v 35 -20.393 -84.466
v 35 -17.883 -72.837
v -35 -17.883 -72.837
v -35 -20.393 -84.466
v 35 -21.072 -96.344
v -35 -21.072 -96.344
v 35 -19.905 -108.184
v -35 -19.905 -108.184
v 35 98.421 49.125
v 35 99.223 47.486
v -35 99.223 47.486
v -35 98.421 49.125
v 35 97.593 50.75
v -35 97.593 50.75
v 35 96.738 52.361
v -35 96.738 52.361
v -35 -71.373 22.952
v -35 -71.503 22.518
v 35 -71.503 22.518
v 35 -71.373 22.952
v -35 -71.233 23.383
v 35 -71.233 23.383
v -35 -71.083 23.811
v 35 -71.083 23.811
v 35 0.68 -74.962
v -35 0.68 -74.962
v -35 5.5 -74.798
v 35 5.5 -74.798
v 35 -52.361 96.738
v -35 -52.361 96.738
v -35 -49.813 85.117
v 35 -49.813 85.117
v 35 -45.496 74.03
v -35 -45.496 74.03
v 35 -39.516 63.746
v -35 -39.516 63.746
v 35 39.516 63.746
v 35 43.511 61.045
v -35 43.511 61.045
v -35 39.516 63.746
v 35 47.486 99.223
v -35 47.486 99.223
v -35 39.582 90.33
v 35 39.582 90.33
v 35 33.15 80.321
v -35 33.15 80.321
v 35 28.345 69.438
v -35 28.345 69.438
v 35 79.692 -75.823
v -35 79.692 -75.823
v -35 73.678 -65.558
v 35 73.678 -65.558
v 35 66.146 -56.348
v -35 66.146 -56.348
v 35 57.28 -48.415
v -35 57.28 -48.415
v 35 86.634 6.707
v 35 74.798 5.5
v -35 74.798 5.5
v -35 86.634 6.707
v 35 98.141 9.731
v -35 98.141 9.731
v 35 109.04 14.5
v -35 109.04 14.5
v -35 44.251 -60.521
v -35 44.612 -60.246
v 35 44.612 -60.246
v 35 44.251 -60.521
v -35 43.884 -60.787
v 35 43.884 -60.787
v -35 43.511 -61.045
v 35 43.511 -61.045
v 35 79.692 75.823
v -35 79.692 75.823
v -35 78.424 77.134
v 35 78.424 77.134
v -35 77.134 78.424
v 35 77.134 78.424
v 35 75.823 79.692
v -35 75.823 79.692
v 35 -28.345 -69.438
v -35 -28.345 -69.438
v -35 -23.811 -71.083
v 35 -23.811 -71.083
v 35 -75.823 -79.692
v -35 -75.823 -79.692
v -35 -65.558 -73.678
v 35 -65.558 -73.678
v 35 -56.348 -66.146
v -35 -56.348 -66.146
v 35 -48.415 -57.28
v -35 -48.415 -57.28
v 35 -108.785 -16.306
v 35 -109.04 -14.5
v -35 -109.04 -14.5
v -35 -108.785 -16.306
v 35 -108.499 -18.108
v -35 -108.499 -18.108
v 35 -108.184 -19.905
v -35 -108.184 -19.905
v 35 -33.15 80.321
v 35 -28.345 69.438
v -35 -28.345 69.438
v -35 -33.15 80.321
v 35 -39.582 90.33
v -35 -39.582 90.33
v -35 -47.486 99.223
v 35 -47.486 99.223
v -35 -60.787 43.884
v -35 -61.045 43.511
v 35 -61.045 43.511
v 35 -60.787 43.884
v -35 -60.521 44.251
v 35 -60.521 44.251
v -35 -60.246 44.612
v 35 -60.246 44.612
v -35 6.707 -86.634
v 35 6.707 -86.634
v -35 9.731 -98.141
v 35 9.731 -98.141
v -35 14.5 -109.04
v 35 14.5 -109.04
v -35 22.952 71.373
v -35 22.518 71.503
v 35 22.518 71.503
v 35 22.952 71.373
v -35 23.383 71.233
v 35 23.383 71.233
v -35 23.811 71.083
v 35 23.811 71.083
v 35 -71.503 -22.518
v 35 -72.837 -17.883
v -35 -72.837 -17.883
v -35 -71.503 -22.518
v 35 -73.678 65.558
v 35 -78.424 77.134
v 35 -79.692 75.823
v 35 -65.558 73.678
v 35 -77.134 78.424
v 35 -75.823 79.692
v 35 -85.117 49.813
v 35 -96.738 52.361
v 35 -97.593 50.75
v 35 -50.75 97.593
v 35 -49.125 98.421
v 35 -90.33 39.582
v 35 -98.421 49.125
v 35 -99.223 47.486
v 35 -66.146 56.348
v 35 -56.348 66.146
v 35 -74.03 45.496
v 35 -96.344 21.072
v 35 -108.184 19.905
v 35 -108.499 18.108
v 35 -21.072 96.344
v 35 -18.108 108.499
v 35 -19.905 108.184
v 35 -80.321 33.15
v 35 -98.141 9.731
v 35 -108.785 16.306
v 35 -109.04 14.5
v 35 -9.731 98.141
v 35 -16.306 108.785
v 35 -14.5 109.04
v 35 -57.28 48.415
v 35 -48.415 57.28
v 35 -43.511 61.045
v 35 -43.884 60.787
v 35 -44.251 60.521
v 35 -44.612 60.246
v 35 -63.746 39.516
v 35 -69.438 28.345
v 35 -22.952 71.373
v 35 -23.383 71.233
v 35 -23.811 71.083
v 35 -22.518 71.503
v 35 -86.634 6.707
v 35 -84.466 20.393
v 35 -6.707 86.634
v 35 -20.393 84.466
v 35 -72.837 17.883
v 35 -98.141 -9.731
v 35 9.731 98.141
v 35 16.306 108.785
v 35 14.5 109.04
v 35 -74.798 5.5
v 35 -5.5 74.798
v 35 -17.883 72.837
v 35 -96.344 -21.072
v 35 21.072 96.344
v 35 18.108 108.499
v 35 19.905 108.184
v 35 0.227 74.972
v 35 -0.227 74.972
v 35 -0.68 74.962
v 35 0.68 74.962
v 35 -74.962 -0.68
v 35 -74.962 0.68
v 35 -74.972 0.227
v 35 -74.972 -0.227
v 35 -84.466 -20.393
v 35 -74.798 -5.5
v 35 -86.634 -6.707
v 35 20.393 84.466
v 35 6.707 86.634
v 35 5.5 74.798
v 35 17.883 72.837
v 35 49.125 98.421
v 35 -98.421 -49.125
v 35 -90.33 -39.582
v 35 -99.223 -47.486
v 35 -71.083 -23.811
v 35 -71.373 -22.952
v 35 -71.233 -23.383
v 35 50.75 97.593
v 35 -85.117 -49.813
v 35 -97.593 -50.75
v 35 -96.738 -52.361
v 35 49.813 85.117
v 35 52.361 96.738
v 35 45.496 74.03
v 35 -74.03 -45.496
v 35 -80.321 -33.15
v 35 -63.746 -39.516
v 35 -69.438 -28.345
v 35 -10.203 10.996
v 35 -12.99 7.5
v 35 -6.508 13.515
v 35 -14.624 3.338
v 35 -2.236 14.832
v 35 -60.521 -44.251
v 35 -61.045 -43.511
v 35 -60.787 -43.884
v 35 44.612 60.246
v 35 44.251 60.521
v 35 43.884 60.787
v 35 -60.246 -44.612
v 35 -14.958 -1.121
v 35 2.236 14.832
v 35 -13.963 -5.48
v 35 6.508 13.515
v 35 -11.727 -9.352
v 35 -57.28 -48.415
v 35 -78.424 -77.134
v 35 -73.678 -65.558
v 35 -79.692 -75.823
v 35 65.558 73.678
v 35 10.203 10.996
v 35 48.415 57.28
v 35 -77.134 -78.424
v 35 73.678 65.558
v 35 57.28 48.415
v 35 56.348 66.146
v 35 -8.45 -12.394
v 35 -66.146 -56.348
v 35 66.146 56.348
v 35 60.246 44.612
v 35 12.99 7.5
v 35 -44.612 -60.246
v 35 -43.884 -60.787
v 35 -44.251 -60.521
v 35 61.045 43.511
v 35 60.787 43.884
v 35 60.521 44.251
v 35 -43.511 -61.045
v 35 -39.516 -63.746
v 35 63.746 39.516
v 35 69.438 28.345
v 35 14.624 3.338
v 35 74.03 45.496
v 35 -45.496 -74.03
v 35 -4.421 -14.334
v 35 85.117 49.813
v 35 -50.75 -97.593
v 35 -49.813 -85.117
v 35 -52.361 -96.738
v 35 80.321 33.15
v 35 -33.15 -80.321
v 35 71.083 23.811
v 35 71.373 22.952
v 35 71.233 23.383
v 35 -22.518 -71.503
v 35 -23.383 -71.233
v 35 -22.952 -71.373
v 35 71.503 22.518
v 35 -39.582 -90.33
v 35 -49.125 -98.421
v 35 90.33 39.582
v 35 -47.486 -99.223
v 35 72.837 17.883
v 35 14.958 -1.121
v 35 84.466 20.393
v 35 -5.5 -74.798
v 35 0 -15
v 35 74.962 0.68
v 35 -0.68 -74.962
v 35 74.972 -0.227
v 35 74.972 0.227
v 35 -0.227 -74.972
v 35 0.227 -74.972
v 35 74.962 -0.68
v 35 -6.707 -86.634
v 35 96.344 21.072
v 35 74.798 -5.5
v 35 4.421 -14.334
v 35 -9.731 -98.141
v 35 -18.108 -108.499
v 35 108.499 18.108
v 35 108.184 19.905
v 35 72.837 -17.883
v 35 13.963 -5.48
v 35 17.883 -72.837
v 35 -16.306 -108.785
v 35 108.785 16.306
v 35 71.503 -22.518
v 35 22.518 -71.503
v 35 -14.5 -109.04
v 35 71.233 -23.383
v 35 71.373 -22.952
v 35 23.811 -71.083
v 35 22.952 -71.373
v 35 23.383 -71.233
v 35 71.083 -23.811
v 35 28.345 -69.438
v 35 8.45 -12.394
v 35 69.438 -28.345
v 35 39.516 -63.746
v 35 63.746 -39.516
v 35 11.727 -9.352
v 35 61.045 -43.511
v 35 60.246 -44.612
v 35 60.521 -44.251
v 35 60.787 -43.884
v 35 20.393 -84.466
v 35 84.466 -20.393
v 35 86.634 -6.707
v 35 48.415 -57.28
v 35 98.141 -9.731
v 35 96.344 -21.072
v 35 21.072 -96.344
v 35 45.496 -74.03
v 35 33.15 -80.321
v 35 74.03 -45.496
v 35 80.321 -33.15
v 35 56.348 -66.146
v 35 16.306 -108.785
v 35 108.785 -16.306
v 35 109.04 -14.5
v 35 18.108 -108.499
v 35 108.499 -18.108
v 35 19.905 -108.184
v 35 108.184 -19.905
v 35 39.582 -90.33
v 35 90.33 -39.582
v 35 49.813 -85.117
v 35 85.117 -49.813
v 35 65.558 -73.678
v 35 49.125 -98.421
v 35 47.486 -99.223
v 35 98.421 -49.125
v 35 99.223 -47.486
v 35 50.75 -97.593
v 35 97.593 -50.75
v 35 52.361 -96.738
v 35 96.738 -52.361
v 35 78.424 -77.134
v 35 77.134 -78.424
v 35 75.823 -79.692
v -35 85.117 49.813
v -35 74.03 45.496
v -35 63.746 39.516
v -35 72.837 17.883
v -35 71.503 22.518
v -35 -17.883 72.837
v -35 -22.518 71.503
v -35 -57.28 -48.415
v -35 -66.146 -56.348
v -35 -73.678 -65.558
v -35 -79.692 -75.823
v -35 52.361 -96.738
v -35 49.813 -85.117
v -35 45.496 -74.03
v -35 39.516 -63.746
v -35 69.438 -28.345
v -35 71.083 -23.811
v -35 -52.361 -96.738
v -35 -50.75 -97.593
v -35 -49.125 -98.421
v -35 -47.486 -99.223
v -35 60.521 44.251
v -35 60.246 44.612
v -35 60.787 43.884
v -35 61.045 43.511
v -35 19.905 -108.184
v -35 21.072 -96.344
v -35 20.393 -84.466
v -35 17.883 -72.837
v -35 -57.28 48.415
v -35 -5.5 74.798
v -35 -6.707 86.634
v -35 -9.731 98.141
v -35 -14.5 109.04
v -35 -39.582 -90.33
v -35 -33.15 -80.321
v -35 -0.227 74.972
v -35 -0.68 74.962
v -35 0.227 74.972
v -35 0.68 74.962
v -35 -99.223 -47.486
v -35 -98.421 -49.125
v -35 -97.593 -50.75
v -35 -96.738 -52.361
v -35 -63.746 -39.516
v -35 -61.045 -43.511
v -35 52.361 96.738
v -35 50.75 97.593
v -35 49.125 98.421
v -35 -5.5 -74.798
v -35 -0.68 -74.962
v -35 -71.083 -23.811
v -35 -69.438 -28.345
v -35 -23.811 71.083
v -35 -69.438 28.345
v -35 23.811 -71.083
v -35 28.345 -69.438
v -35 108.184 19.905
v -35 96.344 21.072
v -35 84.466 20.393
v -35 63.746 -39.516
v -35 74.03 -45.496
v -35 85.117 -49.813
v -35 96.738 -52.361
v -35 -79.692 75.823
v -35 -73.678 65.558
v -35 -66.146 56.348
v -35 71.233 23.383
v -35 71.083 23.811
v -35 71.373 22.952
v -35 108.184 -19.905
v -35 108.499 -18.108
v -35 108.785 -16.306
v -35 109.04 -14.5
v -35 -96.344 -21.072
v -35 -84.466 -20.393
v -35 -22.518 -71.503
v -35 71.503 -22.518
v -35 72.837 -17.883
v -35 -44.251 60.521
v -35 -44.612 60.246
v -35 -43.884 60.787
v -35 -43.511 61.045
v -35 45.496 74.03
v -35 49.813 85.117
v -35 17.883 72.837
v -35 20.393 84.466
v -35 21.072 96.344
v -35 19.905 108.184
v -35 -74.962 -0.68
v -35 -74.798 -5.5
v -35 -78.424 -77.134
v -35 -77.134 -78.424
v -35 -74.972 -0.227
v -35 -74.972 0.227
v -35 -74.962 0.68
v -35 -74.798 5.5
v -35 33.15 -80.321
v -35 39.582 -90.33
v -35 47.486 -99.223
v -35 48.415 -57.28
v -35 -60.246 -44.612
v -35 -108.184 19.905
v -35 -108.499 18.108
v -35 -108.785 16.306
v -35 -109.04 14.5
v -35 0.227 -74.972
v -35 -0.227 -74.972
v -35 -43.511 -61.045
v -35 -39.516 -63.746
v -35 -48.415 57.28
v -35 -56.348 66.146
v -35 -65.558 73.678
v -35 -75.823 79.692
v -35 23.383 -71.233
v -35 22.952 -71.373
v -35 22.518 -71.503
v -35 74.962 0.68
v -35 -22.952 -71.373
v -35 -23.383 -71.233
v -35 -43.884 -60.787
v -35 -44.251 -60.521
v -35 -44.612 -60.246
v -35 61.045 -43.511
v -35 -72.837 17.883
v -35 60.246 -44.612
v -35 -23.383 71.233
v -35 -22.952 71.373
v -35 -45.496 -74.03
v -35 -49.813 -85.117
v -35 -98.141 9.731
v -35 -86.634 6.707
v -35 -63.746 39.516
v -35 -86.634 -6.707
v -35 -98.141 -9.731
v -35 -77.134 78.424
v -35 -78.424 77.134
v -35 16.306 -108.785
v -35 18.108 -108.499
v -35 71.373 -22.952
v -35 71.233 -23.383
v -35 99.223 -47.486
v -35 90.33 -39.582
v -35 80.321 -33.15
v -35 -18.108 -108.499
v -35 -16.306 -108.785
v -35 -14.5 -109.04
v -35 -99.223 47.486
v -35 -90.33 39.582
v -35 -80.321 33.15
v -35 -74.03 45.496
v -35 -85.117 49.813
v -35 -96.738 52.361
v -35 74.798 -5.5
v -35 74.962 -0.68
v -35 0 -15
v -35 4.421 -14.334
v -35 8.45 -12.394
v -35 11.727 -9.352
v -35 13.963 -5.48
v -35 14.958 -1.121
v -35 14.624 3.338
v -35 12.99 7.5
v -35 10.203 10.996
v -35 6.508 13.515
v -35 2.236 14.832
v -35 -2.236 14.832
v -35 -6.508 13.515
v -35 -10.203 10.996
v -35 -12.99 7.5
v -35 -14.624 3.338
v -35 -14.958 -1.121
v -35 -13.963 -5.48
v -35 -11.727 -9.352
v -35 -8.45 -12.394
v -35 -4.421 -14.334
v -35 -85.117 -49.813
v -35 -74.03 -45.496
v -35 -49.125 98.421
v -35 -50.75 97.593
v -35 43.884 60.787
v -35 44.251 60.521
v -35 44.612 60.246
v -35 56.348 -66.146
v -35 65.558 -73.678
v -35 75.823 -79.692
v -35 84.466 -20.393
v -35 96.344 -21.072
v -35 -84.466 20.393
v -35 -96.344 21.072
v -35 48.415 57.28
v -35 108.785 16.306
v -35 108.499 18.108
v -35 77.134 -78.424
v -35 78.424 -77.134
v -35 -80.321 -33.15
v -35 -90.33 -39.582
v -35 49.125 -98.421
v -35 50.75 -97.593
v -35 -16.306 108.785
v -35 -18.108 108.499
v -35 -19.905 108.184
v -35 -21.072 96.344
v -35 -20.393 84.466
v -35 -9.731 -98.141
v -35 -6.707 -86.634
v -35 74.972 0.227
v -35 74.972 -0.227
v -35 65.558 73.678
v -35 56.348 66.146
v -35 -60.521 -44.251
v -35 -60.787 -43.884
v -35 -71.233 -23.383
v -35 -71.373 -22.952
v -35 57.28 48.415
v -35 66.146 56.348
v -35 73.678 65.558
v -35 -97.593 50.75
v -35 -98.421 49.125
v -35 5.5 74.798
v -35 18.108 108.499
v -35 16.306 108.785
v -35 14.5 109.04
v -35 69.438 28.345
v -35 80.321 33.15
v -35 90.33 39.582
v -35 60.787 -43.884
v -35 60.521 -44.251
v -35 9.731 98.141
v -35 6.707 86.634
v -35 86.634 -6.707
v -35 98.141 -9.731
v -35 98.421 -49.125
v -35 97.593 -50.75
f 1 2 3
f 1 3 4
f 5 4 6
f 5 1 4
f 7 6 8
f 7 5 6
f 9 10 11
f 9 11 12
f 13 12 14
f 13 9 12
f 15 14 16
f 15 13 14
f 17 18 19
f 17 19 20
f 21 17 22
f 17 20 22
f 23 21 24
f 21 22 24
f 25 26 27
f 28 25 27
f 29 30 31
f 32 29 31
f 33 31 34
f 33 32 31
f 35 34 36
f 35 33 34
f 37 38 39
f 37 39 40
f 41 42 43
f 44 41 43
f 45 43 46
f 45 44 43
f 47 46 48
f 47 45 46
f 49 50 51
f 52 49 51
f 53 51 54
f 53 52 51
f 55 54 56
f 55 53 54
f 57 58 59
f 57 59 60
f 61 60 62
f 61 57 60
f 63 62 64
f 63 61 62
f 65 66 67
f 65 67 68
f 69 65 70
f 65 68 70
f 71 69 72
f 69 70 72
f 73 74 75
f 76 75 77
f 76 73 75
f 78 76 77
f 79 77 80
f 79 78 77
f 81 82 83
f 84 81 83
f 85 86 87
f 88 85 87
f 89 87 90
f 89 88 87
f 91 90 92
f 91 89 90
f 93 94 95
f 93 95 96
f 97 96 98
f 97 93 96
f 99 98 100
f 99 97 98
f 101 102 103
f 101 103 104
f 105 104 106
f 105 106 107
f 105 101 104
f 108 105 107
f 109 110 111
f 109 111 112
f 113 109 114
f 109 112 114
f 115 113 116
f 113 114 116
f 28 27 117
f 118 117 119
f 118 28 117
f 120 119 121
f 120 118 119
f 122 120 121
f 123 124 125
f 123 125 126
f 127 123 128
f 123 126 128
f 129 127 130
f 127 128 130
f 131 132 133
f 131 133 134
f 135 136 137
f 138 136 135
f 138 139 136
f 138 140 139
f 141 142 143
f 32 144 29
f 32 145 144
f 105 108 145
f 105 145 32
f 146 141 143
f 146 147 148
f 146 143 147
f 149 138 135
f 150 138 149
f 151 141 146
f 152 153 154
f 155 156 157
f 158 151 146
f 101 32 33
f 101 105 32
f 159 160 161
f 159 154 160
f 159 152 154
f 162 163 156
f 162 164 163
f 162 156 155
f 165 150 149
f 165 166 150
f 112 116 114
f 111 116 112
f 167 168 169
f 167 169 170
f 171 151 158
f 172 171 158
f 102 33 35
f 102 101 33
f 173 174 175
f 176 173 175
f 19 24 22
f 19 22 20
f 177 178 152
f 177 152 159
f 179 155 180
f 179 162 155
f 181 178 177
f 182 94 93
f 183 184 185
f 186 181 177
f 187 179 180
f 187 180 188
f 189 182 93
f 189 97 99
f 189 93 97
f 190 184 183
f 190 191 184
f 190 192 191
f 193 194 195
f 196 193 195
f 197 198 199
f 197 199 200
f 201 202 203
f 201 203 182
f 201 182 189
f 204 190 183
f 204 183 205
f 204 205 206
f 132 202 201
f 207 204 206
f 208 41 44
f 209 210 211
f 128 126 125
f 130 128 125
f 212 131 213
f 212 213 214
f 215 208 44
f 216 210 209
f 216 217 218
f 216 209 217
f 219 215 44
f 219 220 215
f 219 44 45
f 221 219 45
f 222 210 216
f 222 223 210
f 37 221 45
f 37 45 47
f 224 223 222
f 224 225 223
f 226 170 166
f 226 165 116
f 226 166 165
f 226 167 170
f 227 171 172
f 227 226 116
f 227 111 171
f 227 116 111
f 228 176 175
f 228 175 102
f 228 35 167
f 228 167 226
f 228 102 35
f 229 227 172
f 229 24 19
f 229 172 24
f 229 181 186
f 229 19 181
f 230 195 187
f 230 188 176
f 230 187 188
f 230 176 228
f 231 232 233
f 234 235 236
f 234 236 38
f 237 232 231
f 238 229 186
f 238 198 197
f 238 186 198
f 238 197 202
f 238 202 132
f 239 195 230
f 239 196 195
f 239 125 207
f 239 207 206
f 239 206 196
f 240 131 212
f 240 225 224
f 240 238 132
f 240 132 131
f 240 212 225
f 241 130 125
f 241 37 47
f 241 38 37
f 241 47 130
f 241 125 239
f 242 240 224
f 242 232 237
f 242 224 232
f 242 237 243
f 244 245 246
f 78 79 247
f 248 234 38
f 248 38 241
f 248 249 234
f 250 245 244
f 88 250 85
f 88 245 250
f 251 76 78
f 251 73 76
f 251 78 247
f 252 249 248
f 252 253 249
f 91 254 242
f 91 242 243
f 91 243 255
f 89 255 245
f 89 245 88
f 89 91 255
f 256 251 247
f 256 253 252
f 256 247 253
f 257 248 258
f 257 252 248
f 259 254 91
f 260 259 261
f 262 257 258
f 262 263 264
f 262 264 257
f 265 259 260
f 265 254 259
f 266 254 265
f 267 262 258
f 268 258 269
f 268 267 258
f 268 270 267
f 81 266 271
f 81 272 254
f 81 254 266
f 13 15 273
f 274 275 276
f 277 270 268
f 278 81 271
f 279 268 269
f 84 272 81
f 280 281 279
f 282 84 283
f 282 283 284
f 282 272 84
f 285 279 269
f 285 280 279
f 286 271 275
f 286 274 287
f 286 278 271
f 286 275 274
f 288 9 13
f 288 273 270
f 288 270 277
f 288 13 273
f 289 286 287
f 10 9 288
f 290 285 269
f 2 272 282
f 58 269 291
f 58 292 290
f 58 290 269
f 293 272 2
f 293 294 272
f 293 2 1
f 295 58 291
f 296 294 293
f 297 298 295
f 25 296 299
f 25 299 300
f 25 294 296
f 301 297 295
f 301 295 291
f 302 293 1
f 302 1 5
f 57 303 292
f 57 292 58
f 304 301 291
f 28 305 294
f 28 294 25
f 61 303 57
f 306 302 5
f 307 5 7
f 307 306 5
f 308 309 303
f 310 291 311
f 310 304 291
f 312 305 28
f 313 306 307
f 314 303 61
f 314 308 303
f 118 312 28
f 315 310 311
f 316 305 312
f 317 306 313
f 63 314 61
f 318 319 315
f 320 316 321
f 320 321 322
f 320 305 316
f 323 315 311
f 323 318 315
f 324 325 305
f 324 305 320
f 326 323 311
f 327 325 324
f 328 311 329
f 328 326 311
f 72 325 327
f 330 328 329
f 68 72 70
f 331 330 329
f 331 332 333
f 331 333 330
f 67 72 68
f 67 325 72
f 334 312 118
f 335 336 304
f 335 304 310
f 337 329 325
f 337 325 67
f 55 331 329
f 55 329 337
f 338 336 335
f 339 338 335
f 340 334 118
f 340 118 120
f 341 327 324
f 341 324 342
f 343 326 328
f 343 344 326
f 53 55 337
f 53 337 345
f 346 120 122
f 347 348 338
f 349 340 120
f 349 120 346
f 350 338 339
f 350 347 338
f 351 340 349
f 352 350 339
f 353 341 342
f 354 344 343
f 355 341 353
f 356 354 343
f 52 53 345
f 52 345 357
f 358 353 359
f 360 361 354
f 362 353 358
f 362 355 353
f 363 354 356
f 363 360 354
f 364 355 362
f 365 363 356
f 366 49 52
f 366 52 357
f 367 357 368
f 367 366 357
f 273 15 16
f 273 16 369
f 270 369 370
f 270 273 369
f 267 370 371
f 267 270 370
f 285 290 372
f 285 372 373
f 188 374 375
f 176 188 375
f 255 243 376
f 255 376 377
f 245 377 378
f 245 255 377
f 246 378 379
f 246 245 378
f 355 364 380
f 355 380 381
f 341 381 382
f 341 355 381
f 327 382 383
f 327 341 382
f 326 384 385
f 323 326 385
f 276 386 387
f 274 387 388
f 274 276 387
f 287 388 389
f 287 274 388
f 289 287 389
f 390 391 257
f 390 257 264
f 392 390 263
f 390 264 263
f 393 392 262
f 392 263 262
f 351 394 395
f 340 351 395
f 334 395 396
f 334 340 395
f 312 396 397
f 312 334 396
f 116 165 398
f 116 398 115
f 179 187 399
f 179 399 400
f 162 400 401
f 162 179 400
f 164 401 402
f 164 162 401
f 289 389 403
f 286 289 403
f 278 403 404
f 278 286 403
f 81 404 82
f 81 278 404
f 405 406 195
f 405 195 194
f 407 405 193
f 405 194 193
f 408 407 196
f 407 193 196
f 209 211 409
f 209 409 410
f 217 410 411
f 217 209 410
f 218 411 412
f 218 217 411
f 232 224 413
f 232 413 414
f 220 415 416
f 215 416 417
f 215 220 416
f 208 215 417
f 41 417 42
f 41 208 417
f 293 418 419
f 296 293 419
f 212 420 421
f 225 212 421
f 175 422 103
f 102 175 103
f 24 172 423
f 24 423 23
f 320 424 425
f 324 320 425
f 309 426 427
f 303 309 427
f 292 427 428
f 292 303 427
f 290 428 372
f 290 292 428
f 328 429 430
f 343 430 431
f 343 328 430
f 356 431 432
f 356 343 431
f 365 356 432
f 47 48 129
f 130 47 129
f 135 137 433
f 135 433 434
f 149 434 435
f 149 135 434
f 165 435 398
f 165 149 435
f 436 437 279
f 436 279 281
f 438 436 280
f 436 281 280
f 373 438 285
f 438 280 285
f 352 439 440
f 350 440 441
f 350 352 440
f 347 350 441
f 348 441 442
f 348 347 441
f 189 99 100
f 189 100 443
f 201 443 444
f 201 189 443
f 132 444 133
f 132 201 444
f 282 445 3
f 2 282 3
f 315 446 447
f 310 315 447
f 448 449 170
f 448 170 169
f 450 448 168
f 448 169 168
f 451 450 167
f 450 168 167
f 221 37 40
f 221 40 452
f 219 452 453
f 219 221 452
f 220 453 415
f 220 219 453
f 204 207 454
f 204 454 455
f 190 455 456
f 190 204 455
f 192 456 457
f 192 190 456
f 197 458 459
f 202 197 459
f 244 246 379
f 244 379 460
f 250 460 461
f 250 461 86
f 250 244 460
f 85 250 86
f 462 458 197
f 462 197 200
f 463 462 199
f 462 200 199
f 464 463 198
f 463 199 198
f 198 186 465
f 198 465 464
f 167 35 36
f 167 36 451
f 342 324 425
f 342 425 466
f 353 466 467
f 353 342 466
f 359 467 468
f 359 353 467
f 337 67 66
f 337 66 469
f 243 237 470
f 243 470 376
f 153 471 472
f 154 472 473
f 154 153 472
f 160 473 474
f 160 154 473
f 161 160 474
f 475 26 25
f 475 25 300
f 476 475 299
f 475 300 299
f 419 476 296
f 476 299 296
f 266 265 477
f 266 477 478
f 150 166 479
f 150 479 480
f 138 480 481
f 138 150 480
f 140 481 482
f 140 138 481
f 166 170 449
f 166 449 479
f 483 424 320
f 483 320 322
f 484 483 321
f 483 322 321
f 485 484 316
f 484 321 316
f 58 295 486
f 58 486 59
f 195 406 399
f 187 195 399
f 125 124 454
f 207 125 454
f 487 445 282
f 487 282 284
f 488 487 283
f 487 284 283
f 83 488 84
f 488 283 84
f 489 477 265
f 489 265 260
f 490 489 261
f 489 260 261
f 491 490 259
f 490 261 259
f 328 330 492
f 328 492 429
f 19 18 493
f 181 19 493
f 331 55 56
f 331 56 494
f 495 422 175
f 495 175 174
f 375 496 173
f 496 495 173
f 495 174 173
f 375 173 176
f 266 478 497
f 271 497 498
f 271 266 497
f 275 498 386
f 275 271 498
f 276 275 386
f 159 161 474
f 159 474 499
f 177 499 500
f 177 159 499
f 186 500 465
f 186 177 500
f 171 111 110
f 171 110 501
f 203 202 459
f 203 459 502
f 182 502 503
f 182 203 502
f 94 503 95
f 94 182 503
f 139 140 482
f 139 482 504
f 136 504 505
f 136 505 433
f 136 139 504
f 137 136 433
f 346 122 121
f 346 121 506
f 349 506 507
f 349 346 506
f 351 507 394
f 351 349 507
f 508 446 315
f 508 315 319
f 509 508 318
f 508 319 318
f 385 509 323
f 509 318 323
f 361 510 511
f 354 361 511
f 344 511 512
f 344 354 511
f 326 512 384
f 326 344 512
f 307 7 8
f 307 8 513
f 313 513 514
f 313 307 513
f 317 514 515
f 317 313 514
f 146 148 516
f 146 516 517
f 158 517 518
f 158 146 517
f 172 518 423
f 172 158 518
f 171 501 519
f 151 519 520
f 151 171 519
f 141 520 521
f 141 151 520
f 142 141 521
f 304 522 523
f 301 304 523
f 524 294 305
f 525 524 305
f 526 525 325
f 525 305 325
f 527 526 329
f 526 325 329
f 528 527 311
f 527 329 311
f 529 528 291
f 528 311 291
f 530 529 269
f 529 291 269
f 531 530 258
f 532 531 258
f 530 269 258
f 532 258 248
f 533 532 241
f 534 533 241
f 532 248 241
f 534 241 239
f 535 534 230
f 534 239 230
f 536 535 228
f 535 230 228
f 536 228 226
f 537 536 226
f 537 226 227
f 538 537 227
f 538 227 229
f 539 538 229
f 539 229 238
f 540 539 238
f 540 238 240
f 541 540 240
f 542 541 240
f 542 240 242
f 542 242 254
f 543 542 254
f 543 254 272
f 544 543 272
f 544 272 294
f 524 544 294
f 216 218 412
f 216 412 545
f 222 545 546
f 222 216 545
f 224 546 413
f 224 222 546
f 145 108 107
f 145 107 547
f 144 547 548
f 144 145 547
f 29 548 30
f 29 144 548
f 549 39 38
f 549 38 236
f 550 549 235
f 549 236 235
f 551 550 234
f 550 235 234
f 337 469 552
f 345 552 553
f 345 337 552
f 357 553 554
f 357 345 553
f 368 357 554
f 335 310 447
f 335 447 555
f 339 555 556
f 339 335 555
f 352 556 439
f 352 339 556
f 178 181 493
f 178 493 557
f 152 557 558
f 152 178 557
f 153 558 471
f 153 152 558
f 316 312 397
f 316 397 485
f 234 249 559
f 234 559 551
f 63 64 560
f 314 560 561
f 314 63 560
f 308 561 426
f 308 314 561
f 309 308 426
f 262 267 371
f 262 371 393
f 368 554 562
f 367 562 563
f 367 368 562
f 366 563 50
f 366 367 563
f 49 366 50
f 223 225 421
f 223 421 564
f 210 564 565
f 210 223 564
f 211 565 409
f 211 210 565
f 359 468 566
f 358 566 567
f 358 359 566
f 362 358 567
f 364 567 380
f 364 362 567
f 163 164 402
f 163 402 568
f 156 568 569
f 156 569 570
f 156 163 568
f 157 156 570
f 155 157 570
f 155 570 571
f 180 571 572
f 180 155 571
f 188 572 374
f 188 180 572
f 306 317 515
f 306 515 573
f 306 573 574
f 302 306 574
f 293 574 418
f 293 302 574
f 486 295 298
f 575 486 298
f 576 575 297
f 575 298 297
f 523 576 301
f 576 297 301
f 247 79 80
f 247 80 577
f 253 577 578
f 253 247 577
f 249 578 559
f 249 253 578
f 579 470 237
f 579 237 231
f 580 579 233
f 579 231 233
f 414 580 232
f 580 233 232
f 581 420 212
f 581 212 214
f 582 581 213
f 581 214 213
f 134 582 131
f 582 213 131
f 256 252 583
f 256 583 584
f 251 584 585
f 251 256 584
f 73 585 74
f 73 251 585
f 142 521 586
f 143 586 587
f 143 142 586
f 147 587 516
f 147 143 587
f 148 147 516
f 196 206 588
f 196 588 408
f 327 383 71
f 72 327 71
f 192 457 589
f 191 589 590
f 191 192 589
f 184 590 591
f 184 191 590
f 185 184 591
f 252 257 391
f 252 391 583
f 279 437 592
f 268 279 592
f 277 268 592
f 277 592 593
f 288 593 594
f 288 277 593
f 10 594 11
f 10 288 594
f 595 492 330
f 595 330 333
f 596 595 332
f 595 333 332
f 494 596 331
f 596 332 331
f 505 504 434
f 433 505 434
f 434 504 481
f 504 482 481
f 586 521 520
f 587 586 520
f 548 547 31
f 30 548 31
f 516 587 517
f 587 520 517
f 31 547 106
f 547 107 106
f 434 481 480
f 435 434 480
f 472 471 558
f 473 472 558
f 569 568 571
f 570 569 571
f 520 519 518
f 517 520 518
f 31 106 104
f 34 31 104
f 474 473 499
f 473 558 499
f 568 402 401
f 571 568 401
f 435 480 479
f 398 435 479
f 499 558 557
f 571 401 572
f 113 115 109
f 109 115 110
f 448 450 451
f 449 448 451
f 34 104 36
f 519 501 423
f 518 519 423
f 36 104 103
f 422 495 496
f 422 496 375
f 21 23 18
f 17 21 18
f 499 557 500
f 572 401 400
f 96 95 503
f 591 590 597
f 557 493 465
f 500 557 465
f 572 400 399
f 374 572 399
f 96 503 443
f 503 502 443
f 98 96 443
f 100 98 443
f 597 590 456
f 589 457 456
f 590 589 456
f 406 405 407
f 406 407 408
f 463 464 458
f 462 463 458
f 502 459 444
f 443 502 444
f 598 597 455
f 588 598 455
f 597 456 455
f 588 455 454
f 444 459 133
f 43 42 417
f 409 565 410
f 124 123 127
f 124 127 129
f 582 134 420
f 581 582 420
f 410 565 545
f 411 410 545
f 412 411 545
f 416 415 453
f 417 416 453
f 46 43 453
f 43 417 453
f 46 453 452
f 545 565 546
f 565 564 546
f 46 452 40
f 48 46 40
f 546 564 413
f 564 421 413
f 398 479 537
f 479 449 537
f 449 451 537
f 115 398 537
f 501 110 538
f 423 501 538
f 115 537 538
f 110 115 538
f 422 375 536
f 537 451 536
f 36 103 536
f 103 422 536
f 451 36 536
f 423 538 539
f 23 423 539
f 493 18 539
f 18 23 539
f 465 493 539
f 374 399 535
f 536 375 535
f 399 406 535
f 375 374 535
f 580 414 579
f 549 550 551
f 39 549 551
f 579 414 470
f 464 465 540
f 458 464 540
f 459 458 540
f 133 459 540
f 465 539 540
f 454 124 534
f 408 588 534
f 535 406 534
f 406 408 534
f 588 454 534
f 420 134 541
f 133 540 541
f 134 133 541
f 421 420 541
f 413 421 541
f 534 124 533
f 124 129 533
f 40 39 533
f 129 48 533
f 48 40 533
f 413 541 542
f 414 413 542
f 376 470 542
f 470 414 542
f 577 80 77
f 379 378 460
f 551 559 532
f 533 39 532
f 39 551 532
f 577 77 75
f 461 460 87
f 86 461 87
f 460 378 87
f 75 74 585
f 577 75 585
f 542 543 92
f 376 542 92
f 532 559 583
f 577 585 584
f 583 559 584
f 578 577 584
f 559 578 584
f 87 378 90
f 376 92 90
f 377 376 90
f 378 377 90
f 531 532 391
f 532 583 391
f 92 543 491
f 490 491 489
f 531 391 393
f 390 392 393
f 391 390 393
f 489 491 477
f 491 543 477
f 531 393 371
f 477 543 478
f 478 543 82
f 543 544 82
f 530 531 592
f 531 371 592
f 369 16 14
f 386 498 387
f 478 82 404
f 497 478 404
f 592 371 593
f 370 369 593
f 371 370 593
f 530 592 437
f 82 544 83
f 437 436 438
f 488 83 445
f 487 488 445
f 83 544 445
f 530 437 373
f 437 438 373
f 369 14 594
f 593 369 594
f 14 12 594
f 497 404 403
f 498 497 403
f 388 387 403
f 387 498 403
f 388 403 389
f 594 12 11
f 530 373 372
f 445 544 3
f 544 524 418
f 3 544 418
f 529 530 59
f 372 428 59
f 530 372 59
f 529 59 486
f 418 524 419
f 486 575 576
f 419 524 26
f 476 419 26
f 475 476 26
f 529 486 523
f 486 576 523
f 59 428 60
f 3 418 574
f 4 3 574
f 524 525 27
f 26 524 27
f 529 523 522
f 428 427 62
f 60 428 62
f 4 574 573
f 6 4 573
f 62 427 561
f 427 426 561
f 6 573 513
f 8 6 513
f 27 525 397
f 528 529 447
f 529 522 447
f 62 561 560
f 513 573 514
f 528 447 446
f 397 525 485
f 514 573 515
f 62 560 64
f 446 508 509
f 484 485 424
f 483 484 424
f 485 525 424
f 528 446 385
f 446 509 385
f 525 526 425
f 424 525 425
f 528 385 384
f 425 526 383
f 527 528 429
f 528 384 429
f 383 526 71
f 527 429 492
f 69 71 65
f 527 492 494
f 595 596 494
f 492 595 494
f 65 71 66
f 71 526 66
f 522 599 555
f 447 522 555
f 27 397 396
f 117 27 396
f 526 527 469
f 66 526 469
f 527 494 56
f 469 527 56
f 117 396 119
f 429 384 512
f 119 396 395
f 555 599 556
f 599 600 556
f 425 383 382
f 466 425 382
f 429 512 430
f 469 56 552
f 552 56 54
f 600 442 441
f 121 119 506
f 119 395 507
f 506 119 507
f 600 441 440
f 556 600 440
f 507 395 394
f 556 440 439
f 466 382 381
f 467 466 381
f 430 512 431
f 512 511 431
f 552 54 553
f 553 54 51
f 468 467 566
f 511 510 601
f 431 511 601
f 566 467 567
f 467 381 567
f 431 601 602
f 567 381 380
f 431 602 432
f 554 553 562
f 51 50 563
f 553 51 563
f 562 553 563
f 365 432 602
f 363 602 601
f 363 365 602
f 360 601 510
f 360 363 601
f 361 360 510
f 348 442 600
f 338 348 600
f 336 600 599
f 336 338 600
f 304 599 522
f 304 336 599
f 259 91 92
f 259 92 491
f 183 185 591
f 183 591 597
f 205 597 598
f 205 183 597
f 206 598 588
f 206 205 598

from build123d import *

# Parameters (mm, degrees)
SKETCH1_R                = 110
BOSS_EXTRUDE1_DEPTH      = 35
SKETCH6_R                = 15
CUT_EXTRUDE4_DEPTH       = 171.587221092
CUT_EXTRUDE5_DEPTH       = 171.587221092
FILLET1_R                = 20
CIRPATTERN3_COUNT        = 20
FILLET1_OF_CIRPATTERN3_R = 20


with BuildPart() as part:
    # Sketch1 → Boss-Extrude1 (new, symmetric)
    with BuildSketch(Plane(origin=(0, 0, 0), x_dir=(0, 0, -1), z_dir=(1, 0, 0))):
        Circle(SKETCH1_R)
    extrude(amount=BOSS_EXTRUDE1_DEPTH, both=True)

    # Sketch6 → Cut-Extrude4 (cut, through all)
    with BuildSketch(Plane(origin=(35, 0, 0), x_dir=(0, 0, -1), z_dir=(1, 0, 0))):
        Circle(SKETCH6_R)
    extrude(amount=-CUT_EXTRUDE4_DEPTH, mode=Mode.SUBTRACT)

    # Sketch7 → Cut-Extrude5 (cut, through all)
    with BuildSketch(Plane(origin=(35, 0, 0), x_dir=(0, 0, -1), z_dir=(1, 0, 0))):
        with BuildLine():
            Line((0, 74.98517078), (-5.5, 74.798061472))
            ThreePointArc((-5.5, 74.798061472), (-7.995035607, 92.446069838), (-14.5, 109.040130227))
            Line((-14.5, 109.040130227), (0, 147))
            Line((0, 147), (14.5, 109.040130227))
            ThreePointArc((14.5, 109.040130227), (7.995035607, 92.446069838), (5.5, 74.798061472))
            Line((5.5, 74.798061472), (0, 74.98517078))
        make_face()
    cut_extrude5 = extrude(amount=-CUT_EXTRUDE5_DEPTH, mode=Mode.SUBTRACT)

    # Fillet1
    # the kernel refuses this fillet: 20 mm, written as the material it takes off along each edge
    with BuildSketch(Plane(origin=(36.700993707, 74.98517078, 0), x_dir=(0, -0.034000204734020274, -0.9994218258963753), z_dir=(-1, 0, 0))) as fillet1_piece_1:
        with BuildLine():
            CenterArc((FILLET1_R * 0.0340198741443, FILLET1_R), FILLET1_R, 266.103112477, 3.896887523)
            Line((-FILLET1_R * 0.033941219248, FILLET1_R * 0.00231202784391), (0, 0))
            Line((0, 0), (FILLET1_R * 0.0340198741443, 0))
        make_face()
    extrude(amount=73.401987414, mode=Mode.SUBTRACT)

    # CirPattern3: Cut-Extrude5 ×20 about axis
    cirpattern3_axis = Axis((0, 0, 0), (1, 0, 0))
    for i in range(1, CIRPATTERN3_COUNT):
        add(cut_extrude5.rotate(cirpattern3_axis, i * 360 / CIRPATTERN3_COUNT), mode=Mode.SUBTRACT)

    # Fillet1 of CirPattern3
    # the kernel refuses this fillet: 20 mm, written as the material it takes off along each edge
    with BuildSketch(Plane(origin=(36.700993707, 71.315135296, 23.171692097), x_dir=(0, -0.3411744450188669, 0.9399999989713128), z_dir=(-1, 0, 0)), Plane(origin=(36.700993707, 60.664277487, 44.075177525), x_dir=(0, -0.6149521535231338, 0.7885644227818424), z_dir=(-1, 0, 0)), Plane(origin=(36.700993707, 44.075177525, 60.664277487), x_dir=(0, -0.8285340606169823, 0.5599386666390654), z_dir=(-1, 0, 0)), Plane(origin=(36.700993707, 23.171692097, 71.315135296), x_dir=(0, -0.9610132811213845, 0.2765022124835726), z_dir=(-1, 0, 0)), Plane(origin=(36.700993707, 0, 74.98517078), x_dir=(0, -0.9994218258963753, -0.03400020473402028), z_dir=(-1, 0, 0)), Plane(origin=(36.700993707, -23.171692097, 71.315135296), x_dir=(0, -0.9399999989713128, -0.3411744450188669), z_dir=(-1, 0, 0)), Plane(origin=(36.700993707, -44.075177525, 60.664277487), x_dir=(0, -0.7885644227818294, -0.6149521535231504), z_dir=(-1, 0, 0)), Plane(origin=(36.700993707, -60.664277487, 44.075177525), x_dir=(0, -0.5599386666390632, -0.8285340606169839), z_dir=(-1, 0, 0)), Plane(origin=(36.700993707, -71.315135296, 23.171692097), x_dir=(0, -0.2765022124835726, -0.9610132811213845), z_dir=(-1, 0, 0)), Plane(origin=(36.700993707, -74.98517078, 0), x_dir=(0, 0.0340002047340203, -0.9994218258963753), z_dir=(-1, 0, 0)), Plane(origin=(36.700993707, -71.315135296, -23.171692097), x_dir=(0, 0.34117444501886857, -0.9399999989713121), z_dir=(-1, 0, 0)), Plane(origin=(36.700993707, -60.664277487, -44.075177525), x_dir=(0, 0.6149521535231454, -0.7885644227818334), z_dir=(-1, 0, 0)), Plane(origin=(36.700993707, -44.075177525, -60.664277487), x_dir=(0, 0.8285340606169823, -0.5599386666390654), z_dir=(-1, 0, 0)), Plane(origin=(36.700993707, -23.171692097, -71.315135296), x_dir=(0, 0.9610132811213842, -0.276502212483574), z_dir=(-1, 0, 0)), Plane(origin=(36.700993707, 0, -74.98517078), x_dir=(0, 0.9994218258963753, 0.034000204734020295), z_dir=(-1, 0, 0)), Plane(origin=(36.700993707, 23.171692097, -71.315135296), x_dir=(0, 0.939999998971314, 0.34117444501886357), z_dir=(-1, 0, 0)), Plane(origin=(36.700993707, 44.075177525, -60.664277487), x_dir=(0, 0.7885644227818333, 0.6149521535231453), z_dir=(-1, 0, 0)), Plane(origin=(36.700993707, 60.664277487, -44.075177525), x_dir=(0, 0.559938666639056, 0.8285340606169888), z_dir=(-1, 0, 0)), Plane(origin=(36.700993707, 71.315135296, -23.171692097), x_dir=(0, 0.2765022124835726, 0.9610132811213845), z_dir=(-1, 0, 0))) as fillet1_of_cirpattern3_piece_1:
        with BuildLine():
            CenterArc((FILLET1_OF_CIRPATTERN3_R * 0.0340198741442, -FILLET1_OF_CIRPATTERN3_R), FILLET1_OF_CIRPATTERN3_R, 90, 3.896887523)
            Line((-FILLET1_OF_CIRPATTERN3_R * 0.033941219248, -FILLET1_OF_CIRPATTERN3_R * 0.00231202784391), (0, 0))
            Line((0, 0), (FILLET1_OF_CIRPATTERN3_R * 0.0340198741443, 0))
        make_face()
    extrude(amount=73.401987414, mode=Mode.SUBTRACT)


solid = part.part
